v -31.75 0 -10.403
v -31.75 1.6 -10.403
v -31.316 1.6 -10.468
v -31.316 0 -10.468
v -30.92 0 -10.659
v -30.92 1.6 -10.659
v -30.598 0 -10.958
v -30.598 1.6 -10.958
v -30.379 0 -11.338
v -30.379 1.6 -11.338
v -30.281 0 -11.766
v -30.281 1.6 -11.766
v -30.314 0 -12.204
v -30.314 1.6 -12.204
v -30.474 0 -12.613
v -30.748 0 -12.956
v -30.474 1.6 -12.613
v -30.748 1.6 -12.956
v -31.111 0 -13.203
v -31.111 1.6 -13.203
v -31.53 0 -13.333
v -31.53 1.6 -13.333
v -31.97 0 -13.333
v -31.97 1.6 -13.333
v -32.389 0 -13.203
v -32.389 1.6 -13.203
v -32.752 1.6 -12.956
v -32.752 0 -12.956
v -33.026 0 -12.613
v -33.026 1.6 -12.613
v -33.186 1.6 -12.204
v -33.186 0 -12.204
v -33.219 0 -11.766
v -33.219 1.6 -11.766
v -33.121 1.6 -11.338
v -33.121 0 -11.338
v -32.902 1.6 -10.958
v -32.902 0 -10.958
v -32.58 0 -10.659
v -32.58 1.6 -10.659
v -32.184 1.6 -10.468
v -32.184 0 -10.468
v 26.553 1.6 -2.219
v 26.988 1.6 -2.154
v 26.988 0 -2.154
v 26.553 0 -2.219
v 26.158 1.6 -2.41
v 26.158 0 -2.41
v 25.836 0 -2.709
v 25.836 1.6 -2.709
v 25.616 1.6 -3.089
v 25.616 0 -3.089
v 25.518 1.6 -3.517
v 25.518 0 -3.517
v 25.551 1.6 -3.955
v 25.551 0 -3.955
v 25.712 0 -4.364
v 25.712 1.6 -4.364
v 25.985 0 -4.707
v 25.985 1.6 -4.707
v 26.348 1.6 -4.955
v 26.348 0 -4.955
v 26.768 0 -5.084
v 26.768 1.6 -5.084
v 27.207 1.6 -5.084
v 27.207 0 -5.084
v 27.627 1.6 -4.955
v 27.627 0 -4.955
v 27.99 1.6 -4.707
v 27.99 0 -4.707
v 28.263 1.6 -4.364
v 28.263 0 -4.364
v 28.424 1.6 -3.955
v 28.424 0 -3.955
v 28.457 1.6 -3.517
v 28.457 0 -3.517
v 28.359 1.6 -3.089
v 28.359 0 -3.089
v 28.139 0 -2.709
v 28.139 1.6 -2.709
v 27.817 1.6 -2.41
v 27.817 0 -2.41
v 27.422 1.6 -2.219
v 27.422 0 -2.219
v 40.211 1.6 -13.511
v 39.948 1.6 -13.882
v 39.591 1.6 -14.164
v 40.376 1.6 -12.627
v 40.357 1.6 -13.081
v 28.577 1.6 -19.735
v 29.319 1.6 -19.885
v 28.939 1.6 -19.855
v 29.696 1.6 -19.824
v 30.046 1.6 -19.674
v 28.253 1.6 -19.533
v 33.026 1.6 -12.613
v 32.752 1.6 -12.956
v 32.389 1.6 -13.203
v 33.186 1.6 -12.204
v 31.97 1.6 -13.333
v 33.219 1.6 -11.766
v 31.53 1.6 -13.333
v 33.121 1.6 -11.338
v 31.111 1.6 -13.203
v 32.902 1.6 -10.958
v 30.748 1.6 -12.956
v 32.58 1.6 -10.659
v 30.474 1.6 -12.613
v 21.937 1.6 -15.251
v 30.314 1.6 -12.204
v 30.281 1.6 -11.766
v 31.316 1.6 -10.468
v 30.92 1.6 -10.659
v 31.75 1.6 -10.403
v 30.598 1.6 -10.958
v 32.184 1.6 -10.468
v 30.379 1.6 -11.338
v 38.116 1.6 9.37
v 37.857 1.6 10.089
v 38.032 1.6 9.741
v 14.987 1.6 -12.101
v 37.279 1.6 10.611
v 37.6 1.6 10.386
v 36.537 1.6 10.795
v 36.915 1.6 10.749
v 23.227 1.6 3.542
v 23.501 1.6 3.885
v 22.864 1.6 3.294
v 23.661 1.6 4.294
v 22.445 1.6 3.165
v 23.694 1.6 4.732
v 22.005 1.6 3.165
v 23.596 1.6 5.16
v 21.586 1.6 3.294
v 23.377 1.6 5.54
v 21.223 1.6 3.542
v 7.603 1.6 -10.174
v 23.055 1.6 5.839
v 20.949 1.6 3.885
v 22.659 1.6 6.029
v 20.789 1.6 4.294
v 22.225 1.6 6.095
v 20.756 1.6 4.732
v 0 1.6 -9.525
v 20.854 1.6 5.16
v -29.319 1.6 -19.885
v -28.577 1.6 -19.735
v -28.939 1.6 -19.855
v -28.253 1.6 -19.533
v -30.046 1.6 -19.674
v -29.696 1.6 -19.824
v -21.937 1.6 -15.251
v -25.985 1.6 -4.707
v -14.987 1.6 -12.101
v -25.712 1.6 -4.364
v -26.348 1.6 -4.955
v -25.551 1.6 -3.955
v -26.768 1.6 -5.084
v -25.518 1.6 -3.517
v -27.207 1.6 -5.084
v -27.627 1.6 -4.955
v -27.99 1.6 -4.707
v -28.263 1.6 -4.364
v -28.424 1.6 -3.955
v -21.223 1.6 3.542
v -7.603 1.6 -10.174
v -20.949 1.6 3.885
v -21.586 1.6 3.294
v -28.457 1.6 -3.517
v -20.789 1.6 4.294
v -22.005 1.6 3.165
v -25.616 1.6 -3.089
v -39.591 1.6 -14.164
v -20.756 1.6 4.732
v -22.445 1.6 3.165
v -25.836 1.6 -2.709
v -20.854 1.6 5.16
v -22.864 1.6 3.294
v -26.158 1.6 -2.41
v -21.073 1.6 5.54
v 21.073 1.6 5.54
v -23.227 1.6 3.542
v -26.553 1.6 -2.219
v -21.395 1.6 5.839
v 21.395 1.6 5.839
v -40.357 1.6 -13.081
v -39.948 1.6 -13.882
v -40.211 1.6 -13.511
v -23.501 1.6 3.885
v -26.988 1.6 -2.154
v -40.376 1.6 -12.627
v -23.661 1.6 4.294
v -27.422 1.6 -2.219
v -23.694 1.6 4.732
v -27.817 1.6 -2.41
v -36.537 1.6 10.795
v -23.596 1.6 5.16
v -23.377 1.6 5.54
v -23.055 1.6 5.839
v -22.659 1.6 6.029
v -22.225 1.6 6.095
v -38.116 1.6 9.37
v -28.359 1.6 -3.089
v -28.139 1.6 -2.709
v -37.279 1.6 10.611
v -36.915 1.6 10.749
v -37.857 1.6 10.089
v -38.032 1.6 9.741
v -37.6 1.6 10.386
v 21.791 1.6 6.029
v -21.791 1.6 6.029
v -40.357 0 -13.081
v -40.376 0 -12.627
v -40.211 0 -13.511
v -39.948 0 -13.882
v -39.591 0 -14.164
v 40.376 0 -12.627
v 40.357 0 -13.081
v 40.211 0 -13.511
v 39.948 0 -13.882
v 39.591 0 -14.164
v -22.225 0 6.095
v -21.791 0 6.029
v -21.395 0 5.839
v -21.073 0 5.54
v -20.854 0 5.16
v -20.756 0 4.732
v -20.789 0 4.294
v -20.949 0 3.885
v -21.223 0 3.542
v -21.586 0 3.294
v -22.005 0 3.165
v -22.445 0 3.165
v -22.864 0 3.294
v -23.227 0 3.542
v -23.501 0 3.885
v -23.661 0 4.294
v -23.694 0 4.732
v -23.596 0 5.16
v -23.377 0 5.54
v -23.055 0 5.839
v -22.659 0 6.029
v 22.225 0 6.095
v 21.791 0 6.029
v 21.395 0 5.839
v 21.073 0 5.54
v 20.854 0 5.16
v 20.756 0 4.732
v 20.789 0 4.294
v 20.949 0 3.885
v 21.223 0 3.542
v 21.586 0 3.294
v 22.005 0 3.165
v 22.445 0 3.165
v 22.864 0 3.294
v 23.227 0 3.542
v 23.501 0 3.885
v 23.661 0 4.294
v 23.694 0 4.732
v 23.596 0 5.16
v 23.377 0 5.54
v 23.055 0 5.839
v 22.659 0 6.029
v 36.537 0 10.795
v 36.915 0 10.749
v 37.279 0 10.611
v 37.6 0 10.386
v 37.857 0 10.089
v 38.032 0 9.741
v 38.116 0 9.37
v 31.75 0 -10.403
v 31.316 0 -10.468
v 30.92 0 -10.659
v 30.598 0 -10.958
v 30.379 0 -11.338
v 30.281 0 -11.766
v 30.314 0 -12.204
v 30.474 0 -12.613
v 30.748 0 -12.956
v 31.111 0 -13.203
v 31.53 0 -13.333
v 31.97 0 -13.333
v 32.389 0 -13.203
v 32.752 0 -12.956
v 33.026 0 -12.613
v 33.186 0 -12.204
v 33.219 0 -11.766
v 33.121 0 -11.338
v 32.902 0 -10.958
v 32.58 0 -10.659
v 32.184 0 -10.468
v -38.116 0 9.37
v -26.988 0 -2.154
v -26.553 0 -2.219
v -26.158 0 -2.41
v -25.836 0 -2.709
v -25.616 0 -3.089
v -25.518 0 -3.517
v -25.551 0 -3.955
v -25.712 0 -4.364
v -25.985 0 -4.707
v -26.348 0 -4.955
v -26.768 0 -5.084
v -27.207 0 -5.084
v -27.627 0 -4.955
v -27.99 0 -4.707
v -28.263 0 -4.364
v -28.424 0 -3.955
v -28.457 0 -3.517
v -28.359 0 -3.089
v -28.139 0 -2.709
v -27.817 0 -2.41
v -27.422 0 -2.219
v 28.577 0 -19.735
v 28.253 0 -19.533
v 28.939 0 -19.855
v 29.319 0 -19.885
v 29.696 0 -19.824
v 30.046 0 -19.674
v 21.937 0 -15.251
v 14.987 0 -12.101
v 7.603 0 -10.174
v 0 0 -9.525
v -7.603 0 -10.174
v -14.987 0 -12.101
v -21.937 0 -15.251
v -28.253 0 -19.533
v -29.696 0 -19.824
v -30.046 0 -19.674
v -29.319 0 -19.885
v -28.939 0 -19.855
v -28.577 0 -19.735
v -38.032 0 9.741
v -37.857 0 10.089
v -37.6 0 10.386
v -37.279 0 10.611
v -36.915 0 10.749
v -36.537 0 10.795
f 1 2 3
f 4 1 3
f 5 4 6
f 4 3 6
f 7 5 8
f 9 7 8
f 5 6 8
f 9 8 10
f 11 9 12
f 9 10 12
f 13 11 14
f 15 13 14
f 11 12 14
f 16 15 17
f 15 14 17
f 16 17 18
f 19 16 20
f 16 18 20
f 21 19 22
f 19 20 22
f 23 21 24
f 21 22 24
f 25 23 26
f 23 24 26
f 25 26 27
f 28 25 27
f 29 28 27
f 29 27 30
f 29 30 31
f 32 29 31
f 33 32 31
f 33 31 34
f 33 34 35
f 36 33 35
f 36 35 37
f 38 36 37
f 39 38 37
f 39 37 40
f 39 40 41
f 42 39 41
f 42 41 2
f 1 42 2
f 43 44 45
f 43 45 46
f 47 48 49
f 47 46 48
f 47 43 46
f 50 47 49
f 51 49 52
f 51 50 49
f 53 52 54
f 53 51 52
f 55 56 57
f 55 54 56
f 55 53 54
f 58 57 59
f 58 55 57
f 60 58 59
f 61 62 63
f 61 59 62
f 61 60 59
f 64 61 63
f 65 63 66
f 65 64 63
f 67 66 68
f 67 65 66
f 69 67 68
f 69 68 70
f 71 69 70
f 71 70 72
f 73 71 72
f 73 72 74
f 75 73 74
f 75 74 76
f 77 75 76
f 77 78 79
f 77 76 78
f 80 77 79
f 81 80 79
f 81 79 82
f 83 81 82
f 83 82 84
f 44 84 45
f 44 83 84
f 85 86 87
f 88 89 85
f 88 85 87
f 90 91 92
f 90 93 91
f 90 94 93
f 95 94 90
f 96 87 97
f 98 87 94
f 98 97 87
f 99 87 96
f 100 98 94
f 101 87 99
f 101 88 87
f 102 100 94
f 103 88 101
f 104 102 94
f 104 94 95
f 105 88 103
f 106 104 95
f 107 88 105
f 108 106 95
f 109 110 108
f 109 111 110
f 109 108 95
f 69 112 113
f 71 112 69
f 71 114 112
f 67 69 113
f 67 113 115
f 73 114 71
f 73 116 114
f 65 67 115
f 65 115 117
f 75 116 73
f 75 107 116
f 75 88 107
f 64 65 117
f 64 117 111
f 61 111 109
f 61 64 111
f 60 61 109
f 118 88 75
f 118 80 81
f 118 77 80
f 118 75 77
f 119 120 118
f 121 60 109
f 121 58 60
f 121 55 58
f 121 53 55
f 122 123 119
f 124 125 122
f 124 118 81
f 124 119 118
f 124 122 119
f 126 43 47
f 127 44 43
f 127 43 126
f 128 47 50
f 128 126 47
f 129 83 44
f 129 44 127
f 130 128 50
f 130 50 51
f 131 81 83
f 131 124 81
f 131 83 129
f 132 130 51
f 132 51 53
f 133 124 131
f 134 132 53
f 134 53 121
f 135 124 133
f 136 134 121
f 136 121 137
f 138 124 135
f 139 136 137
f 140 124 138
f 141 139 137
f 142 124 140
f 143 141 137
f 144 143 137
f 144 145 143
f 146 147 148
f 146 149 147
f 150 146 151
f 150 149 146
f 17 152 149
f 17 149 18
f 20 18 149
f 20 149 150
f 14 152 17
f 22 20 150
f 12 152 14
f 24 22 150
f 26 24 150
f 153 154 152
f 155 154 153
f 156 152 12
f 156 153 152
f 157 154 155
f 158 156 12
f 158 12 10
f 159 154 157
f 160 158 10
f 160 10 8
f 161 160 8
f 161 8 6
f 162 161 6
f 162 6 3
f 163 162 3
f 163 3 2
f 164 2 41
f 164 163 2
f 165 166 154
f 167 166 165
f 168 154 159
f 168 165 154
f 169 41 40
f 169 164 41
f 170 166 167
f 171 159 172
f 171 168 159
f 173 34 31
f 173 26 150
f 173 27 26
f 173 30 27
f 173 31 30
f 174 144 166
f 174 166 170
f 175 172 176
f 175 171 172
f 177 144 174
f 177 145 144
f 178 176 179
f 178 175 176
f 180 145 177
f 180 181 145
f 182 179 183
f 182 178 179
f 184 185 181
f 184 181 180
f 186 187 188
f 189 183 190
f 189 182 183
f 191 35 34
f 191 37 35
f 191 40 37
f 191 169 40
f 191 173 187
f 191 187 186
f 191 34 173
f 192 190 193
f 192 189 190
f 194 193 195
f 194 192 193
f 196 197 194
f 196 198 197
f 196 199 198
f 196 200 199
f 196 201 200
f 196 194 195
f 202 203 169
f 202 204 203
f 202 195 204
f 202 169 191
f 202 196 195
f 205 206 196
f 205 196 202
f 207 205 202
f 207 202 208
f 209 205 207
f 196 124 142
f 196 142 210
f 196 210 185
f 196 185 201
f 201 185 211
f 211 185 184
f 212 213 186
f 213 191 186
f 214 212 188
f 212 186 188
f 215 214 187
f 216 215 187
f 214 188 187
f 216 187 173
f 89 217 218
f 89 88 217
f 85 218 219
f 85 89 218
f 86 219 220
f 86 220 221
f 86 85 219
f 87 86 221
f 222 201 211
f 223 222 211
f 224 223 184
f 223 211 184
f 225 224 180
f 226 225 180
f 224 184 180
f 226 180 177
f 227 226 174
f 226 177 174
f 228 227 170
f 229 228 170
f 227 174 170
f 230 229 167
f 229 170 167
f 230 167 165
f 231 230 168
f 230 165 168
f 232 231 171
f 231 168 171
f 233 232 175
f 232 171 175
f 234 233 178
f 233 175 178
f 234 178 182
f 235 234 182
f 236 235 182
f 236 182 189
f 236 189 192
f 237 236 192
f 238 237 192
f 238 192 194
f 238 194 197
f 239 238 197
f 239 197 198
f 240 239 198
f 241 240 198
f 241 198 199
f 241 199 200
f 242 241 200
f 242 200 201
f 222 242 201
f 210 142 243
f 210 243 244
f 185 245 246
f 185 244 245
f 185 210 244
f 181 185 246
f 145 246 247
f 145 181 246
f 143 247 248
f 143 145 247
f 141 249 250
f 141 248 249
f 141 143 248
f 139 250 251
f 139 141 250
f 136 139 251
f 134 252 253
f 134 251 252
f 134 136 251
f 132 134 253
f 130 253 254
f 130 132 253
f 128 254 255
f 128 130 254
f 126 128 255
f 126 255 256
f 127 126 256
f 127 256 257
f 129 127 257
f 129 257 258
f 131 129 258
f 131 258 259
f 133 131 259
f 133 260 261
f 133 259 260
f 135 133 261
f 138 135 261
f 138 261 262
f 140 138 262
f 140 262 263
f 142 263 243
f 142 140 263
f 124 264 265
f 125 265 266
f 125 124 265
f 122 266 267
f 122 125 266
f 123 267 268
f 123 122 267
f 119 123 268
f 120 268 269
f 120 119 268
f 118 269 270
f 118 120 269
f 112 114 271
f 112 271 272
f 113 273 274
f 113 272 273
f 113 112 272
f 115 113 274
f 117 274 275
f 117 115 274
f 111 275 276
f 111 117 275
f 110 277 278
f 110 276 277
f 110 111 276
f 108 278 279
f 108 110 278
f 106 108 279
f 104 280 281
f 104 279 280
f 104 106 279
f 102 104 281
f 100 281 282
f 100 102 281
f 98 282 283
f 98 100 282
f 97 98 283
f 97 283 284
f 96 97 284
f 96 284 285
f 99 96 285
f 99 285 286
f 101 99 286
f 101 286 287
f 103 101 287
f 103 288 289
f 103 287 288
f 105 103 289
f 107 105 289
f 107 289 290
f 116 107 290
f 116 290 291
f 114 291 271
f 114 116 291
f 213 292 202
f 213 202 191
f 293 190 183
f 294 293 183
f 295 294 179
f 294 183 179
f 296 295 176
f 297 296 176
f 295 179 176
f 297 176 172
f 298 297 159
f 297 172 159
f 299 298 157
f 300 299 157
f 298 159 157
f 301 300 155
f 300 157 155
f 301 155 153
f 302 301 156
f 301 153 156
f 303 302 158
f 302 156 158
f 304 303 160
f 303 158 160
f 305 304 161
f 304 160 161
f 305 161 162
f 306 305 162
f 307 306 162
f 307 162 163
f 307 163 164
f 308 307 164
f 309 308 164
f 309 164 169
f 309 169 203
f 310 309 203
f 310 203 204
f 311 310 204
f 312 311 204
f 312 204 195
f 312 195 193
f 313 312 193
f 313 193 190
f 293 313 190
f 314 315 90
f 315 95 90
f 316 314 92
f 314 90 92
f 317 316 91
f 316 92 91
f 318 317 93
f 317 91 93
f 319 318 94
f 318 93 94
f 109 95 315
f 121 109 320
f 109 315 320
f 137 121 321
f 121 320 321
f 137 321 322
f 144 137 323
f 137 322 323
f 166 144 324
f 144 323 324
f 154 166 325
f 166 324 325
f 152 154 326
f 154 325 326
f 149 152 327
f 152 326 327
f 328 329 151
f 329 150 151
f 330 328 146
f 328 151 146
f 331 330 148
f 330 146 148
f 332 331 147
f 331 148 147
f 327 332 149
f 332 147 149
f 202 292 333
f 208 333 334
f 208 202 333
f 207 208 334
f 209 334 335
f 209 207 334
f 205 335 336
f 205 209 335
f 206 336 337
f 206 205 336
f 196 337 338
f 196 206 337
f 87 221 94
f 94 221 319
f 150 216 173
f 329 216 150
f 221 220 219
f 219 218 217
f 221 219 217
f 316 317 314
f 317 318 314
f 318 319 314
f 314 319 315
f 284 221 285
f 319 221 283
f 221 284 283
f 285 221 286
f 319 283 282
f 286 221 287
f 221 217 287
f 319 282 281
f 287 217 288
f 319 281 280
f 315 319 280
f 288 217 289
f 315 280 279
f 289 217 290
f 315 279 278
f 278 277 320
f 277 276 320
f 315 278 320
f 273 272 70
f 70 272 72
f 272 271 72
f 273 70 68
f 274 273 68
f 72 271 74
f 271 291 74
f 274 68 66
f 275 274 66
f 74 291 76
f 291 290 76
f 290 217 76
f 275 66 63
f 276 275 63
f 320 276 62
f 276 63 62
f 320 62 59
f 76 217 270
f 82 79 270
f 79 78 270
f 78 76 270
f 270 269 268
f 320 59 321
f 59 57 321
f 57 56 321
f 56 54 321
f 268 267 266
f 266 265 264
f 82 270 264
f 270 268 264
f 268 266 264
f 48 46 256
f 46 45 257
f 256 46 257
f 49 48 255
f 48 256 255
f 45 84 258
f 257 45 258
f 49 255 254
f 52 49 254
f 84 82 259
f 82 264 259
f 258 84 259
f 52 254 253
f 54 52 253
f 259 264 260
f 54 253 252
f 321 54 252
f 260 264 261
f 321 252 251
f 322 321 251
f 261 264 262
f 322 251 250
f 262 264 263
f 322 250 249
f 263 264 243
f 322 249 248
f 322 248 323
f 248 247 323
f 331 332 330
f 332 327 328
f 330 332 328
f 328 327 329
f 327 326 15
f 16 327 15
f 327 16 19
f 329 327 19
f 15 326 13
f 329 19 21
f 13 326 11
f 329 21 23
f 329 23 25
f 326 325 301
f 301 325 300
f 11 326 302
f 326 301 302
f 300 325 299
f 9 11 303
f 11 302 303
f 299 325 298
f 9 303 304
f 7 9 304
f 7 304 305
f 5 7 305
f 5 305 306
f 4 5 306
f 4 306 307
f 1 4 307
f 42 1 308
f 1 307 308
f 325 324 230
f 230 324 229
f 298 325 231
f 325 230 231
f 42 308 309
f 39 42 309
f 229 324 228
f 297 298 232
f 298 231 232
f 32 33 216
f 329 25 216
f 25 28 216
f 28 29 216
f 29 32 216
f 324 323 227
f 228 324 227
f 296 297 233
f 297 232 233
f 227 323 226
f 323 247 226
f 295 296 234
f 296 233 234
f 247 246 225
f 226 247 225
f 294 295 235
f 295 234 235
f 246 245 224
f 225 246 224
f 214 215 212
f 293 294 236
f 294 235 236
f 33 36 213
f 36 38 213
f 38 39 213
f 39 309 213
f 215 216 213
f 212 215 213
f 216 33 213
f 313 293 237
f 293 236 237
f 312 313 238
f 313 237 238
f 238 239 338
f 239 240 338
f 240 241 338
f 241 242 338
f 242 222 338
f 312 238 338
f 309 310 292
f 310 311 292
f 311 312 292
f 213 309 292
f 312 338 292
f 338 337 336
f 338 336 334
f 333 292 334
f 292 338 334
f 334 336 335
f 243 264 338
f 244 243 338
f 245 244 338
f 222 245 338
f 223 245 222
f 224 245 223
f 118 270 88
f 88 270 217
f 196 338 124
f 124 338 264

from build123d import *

# Parameters (mm, degrees)
SKETCH1_W             = 76.2
SKETCH1_H             = 19.05
BOSS_EXTRUDE1_DEPTH   = 1.6
BOSS_EXTRUDE2_DEPTH   = 1.6
BOSS_EXTRUDE3_DEPTH   = 1.6
BOSS_EXTRUDE4_DEPTH   = 1.6
BOSS_EXTRUDE5_DEPTH   = 1.6
FILLET4_R             = 1.5875
F_4_CLEARANCE_HOLE1_D = 2.9464


with BuildPart() as part:
    # Sketch1 → Boss-Extrude1 (new body)
    with BuildSketch(Plane(origin=(0, 0, 0), x_dir=(1, 0, 0), z_dir=(0, 1, 0))):
        Rectangle(SKETCH1_W, SKETCH1_H)
    extrude(amount=BOSS_EXTRUDE1_DEPTH)

    # Sketch2 → Boss-Extrude2 (add)
    with BuildSketch(Plane.XZ):
        Polygon((-40.48125, -13.649445986), (-29.089234633, -20.226629124), (-22.910646178, -9.525), (-34.302661544, -2.947816861), align=None)
    boss_extrude2 = extrude(amount=-BOSS_EXTRUDE2_DEPTH)

    # Sketch3 → Boss-Extrude3 (add)
    with BuildSketch(Plane.XZ):
        Polygon((-38.1, 9.525), (-40.48125, -13.649445986), (-22.910646178, -9.525), align=None)
    boss_extrude3 = extrude(amount=-BOSS_EXTRUDE3_DEPTH)

    # Mirror1: Boss-Extrude2, Boss-Extrude3 across plane
    add(boss_extrude2.mirror(Plane(origin=(0, 0, 0), x_dir=(0, 0, 1), z_dir=(1, 0, 0))))
    add(boss_extrude3.mirror(Plane(origin=(0, 0, 0), x_dir=(0, 0, 1), z_dir=(1, 0, 0))))

    # Sketch4 → Boss-Extrude4 (add)
    with BuildSketch(Plane.XZ):
        with BuildLine():
            Line((-29.089234633, -20.226629124), (-29.089234633, 9.525))
            Line((-29.089234633, 9.525), (29.089234633, 9.525))
            Line((29.089234633, 9.525), (29.089234633, -20.226629124))
            ThreePointArc((29.089234633, -20.226629124), (0, -9.525), (-29.089234633, -20.226629124))
        make_face()
    extrude(amount=-BOSS_EXTRUDE4_DEPTH)

    # Sketch5 → Boss-Extrude5 (add)
    with BuildSketch(Plane.XZ):
        Polygon((-38.1, 9.525), (-37.969503353, 10.795), (37.969503353, 10.795), (38.1, 9.525), align=None)
    extrude(amount=-BOSS_EXTRUDE5_DEPTH)

    # Fillet4
    fillet4_edges = [part.edges().sort_by_distance(p)[0] for p in [
        (-40.48125, 0.8, -13.649445986),
        (-29.089234633, 0.8, -20.226629124),
        (40.48125, 0.8, -13.649445986),
        (29.089234633, 0.8, -20.226629124),
        (37.969503353, 0.8, 10.795),
        (-37.969503353, 0.8, 10.795),
    ]]
    fillet(fillet4_edges, radius=FILLET4_R)

    # #4 Clearance Hole1 (through all)
    with Locations(Plane(origin=(-22.225, 0, 4.621670802), x_dir=(0, 0, -1), z_dir=(0, -1, 0))):
        with Locations((0, 0), (8.248891971, -4.7625), (16.497783942, -9.525)):
            f_4_clearance_hole1 = Hole(F_4_CLEARANCE_HOLE1_D / 2)

    # Mirror2: #4 Clearance Hole1 across plane
    add(f_4_clearance_hole1.mirror(Plane(origin=(0, 0, 0), x_dir=(0, 0, 1), z_dir=(1, 0, 0))), mode=Mode.SUBTRACT)


solid = part.part
